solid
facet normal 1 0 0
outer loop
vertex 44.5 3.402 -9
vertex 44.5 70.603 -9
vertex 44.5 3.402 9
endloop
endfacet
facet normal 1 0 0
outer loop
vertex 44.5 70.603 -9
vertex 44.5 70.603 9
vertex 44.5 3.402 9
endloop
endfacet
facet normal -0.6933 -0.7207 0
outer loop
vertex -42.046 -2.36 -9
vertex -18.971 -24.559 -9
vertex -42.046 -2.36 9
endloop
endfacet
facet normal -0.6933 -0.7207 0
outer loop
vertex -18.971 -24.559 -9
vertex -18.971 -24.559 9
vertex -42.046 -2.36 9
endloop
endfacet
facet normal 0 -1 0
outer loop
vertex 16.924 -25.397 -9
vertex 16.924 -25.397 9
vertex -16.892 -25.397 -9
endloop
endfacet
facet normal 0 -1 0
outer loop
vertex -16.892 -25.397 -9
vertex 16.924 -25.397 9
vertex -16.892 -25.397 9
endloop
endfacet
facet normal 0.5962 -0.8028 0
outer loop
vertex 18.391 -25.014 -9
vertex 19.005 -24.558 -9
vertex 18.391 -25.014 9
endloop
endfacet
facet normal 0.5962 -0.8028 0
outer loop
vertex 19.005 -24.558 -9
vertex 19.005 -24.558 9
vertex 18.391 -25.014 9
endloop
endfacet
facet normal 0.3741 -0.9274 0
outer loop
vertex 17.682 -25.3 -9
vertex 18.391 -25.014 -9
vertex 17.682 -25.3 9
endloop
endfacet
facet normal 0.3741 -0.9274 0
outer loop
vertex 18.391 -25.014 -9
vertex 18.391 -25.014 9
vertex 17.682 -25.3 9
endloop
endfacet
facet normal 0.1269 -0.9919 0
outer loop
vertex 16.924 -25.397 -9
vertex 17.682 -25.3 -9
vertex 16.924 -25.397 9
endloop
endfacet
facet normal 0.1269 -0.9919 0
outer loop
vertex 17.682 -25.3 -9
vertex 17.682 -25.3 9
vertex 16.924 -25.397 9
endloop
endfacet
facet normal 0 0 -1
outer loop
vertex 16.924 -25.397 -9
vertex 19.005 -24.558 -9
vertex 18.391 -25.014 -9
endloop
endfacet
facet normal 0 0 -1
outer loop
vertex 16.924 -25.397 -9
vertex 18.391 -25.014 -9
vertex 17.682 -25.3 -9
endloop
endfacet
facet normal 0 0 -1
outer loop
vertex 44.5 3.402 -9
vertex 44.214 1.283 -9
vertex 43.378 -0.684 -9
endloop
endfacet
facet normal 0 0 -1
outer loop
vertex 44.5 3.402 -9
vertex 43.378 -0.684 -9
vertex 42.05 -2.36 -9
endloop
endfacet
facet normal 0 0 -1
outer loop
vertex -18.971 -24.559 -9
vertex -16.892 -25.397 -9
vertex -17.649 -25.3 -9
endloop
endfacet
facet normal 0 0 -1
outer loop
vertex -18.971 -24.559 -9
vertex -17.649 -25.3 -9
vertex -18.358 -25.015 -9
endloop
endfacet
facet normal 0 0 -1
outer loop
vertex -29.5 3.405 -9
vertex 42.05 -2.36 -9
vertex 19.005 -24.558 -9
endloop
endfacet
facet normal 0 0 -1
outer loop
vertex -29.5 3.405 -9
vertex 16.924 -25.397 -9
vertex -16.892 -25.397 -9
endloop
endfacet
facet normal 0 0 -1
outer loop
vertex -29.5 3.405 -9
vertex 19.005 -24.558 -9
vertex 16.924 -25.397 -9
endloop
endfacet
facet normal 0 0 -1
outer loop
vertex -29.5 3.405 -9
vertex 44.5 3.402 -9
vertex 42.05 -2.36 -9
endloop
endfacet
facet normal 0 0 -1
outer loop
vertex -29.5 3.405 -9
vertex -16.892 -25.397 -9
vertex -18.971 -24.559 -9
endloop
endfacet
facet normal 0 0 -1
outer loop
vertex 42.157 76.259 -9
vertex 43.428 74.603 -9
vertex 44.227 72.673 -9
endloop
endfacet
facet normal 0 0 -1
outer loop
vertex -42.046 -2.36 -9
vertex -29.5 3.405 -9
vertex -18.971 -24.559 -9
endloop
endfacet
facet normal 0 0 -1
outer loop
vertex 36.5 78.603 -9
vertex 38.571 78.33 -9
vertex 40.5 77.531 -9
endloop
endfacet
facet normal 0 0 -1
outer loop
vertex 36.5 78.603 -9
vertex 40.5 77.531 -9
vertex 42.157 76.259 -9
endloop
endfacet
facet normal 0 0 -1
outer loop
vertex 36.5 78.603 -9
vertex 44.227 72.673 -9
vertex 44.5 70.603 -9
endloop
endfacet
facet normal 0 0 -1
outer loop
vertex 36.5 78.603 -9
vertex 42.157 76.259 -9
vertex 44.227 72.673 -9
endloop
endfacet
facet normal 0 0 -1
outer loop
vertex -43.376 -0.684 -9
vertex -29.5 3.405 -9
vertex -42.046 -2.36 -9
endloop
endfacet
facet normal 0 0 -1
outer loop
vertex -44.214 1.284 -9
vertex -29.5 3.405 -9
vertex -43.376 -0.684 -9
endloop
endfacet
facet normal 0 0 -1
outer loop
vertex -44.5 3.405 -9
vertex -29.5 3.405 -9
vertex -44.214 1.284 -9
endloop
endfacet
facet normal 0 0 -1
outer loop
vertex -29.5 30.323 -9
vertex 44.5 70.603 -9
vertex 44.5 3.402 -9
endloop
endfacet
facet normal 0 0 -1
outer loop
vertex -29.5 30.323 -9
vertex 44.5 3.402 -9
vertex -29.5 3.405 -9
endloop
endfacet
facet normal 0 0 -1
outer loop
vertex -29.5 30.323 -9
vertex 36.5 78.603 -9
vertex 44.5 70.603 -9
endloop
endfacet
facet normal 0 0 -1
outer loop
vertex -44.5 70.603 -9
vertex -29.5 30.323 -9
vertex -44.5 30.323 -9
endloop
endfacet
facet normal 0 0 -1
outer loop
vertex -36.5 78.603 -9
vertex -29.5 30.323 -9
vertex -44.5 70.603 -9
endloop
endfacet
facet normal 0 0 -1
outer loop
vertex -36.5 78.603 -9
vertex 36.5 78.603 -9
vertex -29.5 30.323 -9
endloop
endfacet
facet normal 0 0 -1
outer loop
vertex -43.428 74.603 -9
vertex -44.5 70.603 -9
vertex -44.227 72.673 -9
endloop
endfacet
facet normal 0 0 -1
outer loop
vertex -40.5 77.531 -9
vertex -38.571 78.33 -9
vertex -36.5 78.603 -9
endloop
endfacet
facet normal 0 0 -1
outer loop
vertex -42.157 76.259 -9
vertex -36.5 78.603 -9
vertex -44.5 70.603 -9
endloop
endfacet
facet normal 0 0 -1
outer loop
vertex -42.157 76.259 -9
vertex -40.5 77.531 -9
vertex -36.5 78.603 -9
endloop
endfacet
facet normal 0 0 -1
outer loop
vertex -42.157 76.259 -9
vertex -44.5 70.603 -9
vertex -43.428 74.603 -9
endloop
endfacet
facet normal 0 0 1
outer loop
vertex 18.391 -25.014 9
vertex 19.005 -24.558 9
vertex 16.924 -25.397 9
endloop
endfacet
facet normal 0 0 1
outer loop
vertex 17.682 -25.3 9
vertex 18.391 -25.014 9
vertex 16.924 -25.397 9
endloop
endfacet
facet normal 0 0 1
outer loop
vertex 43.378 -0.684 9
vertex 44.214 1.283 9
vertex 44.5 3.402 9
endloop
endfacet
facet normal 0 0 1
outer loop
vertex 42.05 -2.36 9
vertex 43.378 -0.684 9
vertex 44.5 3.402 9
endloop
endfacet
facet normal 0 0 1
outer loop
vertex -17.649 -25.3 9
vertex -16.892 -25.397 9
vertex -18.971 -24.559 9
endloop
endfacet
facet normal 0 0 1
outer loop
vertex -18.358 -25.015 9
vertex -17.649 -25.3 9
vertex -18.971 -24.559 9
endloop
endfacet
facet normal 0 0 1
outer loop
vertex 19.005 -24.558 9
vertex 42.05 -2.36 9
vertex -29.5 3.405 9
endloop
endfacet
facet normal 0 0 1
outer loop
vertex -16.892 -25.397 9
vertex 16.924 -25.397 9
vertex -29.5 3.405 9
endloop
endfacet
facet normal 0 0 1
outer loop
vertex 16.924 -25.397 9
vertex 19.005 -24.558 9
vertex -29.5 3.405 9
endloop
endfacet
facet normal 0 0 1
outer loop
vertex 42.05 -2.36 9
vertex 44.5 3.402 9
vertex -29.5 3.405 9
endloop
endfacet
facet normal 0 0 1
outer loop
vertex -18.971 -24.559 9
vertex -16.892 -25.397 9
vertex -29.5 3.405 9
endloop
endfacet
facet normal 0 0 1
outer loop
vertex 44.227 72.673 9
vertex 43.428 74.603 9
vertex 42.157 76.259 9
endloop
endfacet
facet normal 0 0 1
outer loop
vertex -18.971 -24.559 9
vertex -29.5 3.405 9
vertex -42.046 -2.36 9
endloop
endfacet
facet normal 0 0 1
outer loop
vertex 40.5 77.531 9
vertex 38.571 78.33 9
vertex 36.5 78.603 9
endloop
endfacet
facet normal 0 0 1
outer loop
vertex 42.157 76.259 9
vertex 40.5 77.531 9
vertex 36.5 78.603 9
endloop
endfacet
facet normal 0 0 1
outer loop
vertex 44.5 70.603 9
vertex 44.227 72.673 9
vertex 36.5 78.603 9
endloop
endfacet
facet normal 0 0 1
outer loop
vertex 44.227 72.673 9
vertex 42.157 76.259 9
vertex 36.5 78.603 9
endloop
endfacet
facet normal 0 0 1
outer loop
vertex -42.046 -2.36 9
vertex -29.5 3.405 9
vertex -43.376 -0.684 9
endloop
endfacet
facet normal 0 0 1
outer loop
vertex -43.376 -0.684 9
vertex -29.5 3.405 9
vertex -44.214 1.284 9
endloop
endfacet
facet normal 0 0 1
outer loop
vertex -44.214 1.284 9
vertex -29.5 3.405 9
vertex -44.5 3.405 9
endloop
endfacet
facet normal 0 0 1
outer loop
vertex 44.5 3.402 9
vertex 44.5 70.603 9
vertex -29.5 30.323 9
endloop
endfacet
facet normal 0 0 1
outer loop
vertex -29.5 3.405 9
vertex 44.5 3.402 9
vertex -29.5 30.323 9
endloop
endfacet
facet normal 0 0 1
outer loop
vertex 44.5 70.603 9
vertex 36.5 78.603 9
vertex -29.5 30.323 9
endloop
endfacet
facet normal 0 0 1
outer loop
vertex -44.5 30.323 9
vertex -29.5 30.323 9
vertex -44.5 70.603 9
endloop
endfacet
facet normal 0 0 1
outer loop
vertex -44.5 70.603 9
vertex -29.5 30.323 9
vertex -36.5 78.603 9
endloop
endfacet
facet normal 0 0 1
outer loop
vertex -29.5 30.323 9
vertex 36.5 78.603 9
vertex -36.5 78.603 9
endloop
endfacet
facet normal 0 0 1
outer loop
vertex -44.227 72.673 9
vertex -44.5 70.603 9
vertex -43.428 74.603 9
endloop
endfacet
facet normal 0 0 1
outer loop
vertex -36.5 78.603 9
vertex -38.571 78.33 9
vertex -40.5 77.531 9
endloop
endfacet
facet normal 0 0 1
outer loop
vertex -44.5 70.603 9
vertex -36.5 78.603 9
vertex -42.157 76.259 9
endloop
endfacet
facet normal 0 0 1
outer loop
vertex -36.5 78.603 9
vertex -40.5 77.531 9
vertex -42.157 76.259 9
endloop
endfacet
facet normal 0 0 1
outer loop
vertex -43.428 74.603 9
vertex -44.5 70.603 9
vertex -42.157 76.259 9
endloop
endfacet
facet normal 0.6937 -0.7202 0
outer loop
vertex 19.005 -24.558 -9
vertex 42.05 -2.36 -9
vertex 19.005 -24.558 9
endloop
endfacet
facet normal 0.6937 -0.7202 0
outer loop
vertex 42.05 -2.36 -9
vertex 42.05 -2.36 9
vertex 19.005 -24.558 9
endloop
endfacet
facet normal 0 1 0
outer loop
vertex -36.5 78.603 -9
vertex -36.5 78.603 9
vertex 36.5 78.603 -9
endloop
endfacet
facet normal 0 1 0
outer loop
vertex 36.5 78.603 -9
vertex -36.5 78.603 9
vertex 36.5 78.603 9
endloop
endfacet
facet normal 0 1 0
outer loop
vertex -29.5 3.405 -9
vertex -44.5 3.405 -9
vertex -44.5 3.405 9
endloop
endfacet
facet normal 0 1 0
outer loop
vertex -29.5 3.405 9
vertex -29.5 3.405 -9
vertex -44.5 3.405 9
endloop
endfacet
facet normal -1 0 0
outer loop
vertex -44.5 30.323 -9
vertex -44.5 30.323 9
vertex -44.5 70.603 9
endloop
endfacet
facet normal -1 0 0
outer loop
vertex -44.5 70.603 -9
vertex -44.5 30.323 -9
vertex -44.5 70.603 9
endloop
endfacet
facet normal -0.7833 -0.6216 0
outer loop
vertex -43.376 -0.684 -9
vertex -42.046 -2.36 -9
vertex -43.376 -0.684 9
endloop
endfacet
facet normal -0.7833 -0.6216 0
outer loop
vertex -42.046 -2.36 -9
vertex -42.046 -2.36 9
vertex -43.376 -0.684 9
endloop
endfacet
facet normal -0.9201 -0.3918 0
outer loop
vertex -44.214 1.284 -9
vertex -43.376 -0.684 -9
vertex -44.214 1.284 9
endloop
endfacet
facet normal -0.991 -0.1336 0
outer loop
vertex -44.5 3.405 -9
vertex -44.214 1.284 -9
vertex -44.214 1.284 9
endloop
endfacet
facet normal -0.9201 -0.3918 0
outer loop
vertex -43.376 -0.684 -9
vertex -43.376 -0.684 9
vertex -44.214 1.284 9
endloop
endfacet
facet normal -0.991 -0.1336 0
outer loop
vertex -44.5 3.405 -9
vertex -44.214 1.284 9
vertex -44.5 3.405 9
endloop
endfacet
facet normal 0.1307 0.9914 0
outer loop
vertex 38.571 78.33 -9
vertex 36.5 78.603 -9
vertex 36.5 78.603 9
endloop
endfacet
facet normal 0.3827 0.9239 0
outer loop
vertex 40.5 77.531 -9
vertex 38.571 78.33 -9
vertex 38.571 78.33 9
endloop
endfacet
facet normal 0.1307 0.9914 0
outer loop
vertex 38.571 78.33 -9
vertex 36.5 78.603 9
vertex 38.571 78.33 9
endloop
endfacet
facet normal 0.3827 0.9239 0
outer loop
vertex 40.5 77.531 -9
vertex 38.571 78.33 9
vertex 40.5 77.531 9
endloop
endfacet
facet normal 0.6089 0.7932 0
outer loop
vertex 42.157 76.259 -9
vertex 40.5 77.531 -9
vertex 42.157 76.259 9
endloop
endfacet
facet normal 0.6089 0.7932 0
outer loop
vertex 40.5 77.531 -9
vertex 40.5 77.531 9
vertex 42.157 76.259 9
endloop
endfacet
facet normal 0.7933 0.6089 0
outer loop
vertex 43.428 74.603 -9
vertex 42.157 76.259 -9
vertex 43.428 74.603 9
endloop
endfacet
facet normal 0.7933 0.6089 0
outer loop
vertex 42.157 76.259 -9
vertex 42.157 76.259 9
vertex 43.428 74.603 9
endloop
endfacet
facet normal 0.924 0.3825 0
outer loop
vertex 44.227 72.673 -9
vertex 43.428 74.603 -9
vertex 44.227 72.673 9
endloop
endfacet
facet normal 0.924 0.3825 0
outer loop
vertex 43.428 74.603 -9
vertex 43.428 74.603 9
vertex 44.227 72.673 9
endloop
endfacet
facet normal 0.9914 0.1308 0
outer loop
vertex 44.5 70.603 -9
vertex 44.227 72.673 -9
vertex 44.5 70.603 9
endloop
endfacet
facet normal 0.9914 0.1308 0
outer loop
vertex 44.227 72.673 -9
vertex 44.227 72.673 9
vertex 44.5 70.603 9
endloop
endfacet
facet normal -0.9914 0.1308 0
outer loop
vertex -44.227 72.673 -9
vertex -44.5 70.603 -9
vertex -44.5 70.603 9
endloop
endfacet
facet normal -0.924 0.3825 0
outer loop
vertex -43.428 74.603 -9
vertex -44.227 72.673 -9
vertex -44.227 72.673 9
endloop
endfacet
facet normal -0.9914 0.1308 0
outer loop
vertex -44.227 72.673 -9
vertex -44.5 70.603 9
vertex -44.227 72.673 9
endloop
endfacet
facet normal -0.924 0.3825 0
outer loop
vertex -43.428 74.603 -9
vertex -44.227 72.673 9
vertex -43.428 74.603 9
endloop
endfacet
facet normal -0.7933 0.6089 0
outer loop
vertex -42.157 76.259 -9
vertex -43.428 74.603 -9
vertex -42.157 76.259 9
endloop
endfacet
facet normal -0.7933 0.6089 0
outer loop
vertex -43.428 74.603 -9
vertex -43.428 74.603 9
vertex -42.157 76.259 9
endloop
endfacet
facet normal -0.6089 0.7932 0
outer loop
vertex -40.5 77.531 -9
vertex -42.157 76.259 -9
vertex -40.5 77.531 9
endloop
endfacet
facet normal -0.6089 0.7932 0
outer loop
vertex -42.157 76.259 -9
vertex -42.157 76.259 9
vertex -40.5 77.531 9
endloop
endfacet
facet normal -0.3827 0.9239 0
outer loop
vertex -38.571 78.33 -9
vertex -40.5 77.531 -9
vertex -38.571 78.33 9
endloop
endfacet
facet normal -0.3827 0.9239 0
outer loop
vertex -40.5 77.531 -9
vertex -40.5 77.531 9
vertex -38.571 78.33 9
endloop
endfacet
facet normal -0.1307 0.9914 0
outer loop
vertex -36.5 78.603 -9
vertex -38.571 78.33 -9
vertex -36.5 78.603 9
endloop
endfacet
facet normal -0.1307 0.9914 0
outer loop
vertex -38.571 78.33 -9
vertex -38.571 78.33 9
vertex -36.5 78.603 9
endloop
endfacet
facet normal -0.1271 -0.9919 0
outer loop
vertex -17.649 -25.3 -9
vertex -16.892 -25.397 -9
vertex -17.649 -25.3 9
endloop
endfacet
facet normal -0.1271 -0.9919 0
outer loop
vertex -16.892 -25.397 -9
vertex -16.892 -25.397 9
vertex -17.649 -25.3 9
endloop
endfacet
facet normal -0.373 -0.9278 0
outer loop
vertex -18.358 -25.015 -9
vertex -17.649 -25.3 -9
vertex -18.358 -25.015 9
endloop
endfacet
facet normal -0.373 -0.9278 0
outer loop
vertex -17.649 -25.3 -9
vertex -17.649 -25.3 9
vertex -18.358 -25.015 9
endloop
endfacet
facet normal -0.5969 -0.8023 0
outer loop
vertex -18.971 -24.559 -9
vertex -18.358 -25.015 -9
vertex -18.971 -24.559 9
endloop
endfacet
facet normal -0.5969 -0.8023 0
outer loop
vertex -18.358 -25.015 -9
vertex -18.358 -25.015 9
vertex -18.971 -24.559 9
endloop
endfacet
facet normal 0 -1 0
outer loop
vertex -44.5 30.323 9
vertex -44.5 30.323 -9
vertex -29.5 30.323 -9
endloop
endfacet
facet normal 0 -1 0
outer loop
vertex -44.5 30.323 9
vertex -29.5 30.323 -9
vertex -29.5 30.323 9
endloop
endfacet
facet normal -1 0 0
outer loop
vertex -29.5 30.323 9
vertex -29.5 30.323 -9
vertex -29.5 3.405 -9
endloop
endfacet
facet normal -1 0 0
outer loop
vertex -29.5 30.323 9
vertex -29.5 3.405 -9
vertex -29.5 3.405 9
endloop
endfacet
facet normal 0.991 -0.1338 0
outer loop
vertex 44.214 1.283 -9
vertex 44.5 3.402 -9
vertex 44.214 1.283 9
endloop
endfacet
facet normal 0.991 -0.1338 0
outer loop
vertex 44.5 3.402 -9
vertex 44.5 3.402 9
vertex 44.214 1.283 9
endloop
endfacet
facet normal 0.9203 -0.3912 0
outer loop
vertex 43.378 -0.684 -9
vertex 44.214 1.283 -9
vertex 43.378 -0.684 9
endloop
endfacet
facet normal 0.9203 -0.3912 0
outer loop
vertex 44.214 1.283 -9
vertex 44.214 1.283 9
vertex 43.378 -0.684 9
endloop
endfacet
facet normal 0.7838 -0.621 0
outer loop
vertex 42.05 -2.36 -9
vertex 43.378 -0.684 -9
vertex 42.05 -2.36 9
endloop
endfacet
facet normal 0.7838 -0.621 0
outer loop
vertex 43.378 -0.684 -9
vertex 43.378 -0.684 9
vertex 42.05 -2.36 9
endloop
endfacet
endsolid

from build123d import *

# Parameters (mm, degrees)
PALM_BODY_DEPTH     = 9
SKETCH7_W           = 18
SKETCH7_H           = 26.918715159
BOSS_EXTRUDE1_DEPTH = 15


with BuildPart() as part:
    # Palm_sketch → Palm_Body (new, symmetric)
    with BuildSketch(Plane.XY):
        with BuildLine():
            Line((-36.5, 78.60257579), (36.5, 78.60257579))
            ThreePointArc((36.5, 78.60257579), (42.156854249, 76.259430039), (44.5, 70.60257579))
            Line((44.5, 70.60257579), (44.5, 3.401763707))
            ThreePointArc((44.5, 3.401763707), (43.86206295, 0.271263888), (42.04999272, -2.359970476))
            Line((42.04999272, -2.359970476), (19.004994037, -24.558074529))
            ThreePointArc((19.004994037, -24.558074529), (18.045809386, -25.179685068), (16.923746767, -25.39742421))
            Line((16.923746767, -25.39742421), (-16.891594266, -25.39742421))
            ThreePointArc((-16.891594266, -25.39742421), (-18.012780844, -25.180038208), (-18.971480575, -24.55938465))
            Line((-18.971480575, -24.55938465), (-42.04636349, -2.360489531))
            ThreePointArc((-42.04636349, -2.360489531), (-43.861076957, 0.27192072), (-44.5, 3.404738308))
            Line((-44.5, 3.404738308), (-44.5, 70.60257579))
            ThreePointArc((-44.5, 70.60257579), (-42.156854249, 76.259430039), (-36.5, 78.60257579))
        make_face()
    extrude(amount=PALM_BODY_DEPTH, both=True)


with BuildPart() as body_2:
    # Sketch7 → Boss-Extrude1 (new body)
    with BuildSketch(Plane.ZY.offset(44.5)):
        with Locations((0, 16.864095887)):
            Rectangle(SKETCH7_W, SKETCH7_H)
    extrude(amount=-BOSS_EXTRUDE1_DEPTH)


with BuildPart() as part_1:
    add(part.part)

    # Combine1: cut body 2
    add(body_2.part, mode=Mode.SUBTRACT)


solid = part_1.part
